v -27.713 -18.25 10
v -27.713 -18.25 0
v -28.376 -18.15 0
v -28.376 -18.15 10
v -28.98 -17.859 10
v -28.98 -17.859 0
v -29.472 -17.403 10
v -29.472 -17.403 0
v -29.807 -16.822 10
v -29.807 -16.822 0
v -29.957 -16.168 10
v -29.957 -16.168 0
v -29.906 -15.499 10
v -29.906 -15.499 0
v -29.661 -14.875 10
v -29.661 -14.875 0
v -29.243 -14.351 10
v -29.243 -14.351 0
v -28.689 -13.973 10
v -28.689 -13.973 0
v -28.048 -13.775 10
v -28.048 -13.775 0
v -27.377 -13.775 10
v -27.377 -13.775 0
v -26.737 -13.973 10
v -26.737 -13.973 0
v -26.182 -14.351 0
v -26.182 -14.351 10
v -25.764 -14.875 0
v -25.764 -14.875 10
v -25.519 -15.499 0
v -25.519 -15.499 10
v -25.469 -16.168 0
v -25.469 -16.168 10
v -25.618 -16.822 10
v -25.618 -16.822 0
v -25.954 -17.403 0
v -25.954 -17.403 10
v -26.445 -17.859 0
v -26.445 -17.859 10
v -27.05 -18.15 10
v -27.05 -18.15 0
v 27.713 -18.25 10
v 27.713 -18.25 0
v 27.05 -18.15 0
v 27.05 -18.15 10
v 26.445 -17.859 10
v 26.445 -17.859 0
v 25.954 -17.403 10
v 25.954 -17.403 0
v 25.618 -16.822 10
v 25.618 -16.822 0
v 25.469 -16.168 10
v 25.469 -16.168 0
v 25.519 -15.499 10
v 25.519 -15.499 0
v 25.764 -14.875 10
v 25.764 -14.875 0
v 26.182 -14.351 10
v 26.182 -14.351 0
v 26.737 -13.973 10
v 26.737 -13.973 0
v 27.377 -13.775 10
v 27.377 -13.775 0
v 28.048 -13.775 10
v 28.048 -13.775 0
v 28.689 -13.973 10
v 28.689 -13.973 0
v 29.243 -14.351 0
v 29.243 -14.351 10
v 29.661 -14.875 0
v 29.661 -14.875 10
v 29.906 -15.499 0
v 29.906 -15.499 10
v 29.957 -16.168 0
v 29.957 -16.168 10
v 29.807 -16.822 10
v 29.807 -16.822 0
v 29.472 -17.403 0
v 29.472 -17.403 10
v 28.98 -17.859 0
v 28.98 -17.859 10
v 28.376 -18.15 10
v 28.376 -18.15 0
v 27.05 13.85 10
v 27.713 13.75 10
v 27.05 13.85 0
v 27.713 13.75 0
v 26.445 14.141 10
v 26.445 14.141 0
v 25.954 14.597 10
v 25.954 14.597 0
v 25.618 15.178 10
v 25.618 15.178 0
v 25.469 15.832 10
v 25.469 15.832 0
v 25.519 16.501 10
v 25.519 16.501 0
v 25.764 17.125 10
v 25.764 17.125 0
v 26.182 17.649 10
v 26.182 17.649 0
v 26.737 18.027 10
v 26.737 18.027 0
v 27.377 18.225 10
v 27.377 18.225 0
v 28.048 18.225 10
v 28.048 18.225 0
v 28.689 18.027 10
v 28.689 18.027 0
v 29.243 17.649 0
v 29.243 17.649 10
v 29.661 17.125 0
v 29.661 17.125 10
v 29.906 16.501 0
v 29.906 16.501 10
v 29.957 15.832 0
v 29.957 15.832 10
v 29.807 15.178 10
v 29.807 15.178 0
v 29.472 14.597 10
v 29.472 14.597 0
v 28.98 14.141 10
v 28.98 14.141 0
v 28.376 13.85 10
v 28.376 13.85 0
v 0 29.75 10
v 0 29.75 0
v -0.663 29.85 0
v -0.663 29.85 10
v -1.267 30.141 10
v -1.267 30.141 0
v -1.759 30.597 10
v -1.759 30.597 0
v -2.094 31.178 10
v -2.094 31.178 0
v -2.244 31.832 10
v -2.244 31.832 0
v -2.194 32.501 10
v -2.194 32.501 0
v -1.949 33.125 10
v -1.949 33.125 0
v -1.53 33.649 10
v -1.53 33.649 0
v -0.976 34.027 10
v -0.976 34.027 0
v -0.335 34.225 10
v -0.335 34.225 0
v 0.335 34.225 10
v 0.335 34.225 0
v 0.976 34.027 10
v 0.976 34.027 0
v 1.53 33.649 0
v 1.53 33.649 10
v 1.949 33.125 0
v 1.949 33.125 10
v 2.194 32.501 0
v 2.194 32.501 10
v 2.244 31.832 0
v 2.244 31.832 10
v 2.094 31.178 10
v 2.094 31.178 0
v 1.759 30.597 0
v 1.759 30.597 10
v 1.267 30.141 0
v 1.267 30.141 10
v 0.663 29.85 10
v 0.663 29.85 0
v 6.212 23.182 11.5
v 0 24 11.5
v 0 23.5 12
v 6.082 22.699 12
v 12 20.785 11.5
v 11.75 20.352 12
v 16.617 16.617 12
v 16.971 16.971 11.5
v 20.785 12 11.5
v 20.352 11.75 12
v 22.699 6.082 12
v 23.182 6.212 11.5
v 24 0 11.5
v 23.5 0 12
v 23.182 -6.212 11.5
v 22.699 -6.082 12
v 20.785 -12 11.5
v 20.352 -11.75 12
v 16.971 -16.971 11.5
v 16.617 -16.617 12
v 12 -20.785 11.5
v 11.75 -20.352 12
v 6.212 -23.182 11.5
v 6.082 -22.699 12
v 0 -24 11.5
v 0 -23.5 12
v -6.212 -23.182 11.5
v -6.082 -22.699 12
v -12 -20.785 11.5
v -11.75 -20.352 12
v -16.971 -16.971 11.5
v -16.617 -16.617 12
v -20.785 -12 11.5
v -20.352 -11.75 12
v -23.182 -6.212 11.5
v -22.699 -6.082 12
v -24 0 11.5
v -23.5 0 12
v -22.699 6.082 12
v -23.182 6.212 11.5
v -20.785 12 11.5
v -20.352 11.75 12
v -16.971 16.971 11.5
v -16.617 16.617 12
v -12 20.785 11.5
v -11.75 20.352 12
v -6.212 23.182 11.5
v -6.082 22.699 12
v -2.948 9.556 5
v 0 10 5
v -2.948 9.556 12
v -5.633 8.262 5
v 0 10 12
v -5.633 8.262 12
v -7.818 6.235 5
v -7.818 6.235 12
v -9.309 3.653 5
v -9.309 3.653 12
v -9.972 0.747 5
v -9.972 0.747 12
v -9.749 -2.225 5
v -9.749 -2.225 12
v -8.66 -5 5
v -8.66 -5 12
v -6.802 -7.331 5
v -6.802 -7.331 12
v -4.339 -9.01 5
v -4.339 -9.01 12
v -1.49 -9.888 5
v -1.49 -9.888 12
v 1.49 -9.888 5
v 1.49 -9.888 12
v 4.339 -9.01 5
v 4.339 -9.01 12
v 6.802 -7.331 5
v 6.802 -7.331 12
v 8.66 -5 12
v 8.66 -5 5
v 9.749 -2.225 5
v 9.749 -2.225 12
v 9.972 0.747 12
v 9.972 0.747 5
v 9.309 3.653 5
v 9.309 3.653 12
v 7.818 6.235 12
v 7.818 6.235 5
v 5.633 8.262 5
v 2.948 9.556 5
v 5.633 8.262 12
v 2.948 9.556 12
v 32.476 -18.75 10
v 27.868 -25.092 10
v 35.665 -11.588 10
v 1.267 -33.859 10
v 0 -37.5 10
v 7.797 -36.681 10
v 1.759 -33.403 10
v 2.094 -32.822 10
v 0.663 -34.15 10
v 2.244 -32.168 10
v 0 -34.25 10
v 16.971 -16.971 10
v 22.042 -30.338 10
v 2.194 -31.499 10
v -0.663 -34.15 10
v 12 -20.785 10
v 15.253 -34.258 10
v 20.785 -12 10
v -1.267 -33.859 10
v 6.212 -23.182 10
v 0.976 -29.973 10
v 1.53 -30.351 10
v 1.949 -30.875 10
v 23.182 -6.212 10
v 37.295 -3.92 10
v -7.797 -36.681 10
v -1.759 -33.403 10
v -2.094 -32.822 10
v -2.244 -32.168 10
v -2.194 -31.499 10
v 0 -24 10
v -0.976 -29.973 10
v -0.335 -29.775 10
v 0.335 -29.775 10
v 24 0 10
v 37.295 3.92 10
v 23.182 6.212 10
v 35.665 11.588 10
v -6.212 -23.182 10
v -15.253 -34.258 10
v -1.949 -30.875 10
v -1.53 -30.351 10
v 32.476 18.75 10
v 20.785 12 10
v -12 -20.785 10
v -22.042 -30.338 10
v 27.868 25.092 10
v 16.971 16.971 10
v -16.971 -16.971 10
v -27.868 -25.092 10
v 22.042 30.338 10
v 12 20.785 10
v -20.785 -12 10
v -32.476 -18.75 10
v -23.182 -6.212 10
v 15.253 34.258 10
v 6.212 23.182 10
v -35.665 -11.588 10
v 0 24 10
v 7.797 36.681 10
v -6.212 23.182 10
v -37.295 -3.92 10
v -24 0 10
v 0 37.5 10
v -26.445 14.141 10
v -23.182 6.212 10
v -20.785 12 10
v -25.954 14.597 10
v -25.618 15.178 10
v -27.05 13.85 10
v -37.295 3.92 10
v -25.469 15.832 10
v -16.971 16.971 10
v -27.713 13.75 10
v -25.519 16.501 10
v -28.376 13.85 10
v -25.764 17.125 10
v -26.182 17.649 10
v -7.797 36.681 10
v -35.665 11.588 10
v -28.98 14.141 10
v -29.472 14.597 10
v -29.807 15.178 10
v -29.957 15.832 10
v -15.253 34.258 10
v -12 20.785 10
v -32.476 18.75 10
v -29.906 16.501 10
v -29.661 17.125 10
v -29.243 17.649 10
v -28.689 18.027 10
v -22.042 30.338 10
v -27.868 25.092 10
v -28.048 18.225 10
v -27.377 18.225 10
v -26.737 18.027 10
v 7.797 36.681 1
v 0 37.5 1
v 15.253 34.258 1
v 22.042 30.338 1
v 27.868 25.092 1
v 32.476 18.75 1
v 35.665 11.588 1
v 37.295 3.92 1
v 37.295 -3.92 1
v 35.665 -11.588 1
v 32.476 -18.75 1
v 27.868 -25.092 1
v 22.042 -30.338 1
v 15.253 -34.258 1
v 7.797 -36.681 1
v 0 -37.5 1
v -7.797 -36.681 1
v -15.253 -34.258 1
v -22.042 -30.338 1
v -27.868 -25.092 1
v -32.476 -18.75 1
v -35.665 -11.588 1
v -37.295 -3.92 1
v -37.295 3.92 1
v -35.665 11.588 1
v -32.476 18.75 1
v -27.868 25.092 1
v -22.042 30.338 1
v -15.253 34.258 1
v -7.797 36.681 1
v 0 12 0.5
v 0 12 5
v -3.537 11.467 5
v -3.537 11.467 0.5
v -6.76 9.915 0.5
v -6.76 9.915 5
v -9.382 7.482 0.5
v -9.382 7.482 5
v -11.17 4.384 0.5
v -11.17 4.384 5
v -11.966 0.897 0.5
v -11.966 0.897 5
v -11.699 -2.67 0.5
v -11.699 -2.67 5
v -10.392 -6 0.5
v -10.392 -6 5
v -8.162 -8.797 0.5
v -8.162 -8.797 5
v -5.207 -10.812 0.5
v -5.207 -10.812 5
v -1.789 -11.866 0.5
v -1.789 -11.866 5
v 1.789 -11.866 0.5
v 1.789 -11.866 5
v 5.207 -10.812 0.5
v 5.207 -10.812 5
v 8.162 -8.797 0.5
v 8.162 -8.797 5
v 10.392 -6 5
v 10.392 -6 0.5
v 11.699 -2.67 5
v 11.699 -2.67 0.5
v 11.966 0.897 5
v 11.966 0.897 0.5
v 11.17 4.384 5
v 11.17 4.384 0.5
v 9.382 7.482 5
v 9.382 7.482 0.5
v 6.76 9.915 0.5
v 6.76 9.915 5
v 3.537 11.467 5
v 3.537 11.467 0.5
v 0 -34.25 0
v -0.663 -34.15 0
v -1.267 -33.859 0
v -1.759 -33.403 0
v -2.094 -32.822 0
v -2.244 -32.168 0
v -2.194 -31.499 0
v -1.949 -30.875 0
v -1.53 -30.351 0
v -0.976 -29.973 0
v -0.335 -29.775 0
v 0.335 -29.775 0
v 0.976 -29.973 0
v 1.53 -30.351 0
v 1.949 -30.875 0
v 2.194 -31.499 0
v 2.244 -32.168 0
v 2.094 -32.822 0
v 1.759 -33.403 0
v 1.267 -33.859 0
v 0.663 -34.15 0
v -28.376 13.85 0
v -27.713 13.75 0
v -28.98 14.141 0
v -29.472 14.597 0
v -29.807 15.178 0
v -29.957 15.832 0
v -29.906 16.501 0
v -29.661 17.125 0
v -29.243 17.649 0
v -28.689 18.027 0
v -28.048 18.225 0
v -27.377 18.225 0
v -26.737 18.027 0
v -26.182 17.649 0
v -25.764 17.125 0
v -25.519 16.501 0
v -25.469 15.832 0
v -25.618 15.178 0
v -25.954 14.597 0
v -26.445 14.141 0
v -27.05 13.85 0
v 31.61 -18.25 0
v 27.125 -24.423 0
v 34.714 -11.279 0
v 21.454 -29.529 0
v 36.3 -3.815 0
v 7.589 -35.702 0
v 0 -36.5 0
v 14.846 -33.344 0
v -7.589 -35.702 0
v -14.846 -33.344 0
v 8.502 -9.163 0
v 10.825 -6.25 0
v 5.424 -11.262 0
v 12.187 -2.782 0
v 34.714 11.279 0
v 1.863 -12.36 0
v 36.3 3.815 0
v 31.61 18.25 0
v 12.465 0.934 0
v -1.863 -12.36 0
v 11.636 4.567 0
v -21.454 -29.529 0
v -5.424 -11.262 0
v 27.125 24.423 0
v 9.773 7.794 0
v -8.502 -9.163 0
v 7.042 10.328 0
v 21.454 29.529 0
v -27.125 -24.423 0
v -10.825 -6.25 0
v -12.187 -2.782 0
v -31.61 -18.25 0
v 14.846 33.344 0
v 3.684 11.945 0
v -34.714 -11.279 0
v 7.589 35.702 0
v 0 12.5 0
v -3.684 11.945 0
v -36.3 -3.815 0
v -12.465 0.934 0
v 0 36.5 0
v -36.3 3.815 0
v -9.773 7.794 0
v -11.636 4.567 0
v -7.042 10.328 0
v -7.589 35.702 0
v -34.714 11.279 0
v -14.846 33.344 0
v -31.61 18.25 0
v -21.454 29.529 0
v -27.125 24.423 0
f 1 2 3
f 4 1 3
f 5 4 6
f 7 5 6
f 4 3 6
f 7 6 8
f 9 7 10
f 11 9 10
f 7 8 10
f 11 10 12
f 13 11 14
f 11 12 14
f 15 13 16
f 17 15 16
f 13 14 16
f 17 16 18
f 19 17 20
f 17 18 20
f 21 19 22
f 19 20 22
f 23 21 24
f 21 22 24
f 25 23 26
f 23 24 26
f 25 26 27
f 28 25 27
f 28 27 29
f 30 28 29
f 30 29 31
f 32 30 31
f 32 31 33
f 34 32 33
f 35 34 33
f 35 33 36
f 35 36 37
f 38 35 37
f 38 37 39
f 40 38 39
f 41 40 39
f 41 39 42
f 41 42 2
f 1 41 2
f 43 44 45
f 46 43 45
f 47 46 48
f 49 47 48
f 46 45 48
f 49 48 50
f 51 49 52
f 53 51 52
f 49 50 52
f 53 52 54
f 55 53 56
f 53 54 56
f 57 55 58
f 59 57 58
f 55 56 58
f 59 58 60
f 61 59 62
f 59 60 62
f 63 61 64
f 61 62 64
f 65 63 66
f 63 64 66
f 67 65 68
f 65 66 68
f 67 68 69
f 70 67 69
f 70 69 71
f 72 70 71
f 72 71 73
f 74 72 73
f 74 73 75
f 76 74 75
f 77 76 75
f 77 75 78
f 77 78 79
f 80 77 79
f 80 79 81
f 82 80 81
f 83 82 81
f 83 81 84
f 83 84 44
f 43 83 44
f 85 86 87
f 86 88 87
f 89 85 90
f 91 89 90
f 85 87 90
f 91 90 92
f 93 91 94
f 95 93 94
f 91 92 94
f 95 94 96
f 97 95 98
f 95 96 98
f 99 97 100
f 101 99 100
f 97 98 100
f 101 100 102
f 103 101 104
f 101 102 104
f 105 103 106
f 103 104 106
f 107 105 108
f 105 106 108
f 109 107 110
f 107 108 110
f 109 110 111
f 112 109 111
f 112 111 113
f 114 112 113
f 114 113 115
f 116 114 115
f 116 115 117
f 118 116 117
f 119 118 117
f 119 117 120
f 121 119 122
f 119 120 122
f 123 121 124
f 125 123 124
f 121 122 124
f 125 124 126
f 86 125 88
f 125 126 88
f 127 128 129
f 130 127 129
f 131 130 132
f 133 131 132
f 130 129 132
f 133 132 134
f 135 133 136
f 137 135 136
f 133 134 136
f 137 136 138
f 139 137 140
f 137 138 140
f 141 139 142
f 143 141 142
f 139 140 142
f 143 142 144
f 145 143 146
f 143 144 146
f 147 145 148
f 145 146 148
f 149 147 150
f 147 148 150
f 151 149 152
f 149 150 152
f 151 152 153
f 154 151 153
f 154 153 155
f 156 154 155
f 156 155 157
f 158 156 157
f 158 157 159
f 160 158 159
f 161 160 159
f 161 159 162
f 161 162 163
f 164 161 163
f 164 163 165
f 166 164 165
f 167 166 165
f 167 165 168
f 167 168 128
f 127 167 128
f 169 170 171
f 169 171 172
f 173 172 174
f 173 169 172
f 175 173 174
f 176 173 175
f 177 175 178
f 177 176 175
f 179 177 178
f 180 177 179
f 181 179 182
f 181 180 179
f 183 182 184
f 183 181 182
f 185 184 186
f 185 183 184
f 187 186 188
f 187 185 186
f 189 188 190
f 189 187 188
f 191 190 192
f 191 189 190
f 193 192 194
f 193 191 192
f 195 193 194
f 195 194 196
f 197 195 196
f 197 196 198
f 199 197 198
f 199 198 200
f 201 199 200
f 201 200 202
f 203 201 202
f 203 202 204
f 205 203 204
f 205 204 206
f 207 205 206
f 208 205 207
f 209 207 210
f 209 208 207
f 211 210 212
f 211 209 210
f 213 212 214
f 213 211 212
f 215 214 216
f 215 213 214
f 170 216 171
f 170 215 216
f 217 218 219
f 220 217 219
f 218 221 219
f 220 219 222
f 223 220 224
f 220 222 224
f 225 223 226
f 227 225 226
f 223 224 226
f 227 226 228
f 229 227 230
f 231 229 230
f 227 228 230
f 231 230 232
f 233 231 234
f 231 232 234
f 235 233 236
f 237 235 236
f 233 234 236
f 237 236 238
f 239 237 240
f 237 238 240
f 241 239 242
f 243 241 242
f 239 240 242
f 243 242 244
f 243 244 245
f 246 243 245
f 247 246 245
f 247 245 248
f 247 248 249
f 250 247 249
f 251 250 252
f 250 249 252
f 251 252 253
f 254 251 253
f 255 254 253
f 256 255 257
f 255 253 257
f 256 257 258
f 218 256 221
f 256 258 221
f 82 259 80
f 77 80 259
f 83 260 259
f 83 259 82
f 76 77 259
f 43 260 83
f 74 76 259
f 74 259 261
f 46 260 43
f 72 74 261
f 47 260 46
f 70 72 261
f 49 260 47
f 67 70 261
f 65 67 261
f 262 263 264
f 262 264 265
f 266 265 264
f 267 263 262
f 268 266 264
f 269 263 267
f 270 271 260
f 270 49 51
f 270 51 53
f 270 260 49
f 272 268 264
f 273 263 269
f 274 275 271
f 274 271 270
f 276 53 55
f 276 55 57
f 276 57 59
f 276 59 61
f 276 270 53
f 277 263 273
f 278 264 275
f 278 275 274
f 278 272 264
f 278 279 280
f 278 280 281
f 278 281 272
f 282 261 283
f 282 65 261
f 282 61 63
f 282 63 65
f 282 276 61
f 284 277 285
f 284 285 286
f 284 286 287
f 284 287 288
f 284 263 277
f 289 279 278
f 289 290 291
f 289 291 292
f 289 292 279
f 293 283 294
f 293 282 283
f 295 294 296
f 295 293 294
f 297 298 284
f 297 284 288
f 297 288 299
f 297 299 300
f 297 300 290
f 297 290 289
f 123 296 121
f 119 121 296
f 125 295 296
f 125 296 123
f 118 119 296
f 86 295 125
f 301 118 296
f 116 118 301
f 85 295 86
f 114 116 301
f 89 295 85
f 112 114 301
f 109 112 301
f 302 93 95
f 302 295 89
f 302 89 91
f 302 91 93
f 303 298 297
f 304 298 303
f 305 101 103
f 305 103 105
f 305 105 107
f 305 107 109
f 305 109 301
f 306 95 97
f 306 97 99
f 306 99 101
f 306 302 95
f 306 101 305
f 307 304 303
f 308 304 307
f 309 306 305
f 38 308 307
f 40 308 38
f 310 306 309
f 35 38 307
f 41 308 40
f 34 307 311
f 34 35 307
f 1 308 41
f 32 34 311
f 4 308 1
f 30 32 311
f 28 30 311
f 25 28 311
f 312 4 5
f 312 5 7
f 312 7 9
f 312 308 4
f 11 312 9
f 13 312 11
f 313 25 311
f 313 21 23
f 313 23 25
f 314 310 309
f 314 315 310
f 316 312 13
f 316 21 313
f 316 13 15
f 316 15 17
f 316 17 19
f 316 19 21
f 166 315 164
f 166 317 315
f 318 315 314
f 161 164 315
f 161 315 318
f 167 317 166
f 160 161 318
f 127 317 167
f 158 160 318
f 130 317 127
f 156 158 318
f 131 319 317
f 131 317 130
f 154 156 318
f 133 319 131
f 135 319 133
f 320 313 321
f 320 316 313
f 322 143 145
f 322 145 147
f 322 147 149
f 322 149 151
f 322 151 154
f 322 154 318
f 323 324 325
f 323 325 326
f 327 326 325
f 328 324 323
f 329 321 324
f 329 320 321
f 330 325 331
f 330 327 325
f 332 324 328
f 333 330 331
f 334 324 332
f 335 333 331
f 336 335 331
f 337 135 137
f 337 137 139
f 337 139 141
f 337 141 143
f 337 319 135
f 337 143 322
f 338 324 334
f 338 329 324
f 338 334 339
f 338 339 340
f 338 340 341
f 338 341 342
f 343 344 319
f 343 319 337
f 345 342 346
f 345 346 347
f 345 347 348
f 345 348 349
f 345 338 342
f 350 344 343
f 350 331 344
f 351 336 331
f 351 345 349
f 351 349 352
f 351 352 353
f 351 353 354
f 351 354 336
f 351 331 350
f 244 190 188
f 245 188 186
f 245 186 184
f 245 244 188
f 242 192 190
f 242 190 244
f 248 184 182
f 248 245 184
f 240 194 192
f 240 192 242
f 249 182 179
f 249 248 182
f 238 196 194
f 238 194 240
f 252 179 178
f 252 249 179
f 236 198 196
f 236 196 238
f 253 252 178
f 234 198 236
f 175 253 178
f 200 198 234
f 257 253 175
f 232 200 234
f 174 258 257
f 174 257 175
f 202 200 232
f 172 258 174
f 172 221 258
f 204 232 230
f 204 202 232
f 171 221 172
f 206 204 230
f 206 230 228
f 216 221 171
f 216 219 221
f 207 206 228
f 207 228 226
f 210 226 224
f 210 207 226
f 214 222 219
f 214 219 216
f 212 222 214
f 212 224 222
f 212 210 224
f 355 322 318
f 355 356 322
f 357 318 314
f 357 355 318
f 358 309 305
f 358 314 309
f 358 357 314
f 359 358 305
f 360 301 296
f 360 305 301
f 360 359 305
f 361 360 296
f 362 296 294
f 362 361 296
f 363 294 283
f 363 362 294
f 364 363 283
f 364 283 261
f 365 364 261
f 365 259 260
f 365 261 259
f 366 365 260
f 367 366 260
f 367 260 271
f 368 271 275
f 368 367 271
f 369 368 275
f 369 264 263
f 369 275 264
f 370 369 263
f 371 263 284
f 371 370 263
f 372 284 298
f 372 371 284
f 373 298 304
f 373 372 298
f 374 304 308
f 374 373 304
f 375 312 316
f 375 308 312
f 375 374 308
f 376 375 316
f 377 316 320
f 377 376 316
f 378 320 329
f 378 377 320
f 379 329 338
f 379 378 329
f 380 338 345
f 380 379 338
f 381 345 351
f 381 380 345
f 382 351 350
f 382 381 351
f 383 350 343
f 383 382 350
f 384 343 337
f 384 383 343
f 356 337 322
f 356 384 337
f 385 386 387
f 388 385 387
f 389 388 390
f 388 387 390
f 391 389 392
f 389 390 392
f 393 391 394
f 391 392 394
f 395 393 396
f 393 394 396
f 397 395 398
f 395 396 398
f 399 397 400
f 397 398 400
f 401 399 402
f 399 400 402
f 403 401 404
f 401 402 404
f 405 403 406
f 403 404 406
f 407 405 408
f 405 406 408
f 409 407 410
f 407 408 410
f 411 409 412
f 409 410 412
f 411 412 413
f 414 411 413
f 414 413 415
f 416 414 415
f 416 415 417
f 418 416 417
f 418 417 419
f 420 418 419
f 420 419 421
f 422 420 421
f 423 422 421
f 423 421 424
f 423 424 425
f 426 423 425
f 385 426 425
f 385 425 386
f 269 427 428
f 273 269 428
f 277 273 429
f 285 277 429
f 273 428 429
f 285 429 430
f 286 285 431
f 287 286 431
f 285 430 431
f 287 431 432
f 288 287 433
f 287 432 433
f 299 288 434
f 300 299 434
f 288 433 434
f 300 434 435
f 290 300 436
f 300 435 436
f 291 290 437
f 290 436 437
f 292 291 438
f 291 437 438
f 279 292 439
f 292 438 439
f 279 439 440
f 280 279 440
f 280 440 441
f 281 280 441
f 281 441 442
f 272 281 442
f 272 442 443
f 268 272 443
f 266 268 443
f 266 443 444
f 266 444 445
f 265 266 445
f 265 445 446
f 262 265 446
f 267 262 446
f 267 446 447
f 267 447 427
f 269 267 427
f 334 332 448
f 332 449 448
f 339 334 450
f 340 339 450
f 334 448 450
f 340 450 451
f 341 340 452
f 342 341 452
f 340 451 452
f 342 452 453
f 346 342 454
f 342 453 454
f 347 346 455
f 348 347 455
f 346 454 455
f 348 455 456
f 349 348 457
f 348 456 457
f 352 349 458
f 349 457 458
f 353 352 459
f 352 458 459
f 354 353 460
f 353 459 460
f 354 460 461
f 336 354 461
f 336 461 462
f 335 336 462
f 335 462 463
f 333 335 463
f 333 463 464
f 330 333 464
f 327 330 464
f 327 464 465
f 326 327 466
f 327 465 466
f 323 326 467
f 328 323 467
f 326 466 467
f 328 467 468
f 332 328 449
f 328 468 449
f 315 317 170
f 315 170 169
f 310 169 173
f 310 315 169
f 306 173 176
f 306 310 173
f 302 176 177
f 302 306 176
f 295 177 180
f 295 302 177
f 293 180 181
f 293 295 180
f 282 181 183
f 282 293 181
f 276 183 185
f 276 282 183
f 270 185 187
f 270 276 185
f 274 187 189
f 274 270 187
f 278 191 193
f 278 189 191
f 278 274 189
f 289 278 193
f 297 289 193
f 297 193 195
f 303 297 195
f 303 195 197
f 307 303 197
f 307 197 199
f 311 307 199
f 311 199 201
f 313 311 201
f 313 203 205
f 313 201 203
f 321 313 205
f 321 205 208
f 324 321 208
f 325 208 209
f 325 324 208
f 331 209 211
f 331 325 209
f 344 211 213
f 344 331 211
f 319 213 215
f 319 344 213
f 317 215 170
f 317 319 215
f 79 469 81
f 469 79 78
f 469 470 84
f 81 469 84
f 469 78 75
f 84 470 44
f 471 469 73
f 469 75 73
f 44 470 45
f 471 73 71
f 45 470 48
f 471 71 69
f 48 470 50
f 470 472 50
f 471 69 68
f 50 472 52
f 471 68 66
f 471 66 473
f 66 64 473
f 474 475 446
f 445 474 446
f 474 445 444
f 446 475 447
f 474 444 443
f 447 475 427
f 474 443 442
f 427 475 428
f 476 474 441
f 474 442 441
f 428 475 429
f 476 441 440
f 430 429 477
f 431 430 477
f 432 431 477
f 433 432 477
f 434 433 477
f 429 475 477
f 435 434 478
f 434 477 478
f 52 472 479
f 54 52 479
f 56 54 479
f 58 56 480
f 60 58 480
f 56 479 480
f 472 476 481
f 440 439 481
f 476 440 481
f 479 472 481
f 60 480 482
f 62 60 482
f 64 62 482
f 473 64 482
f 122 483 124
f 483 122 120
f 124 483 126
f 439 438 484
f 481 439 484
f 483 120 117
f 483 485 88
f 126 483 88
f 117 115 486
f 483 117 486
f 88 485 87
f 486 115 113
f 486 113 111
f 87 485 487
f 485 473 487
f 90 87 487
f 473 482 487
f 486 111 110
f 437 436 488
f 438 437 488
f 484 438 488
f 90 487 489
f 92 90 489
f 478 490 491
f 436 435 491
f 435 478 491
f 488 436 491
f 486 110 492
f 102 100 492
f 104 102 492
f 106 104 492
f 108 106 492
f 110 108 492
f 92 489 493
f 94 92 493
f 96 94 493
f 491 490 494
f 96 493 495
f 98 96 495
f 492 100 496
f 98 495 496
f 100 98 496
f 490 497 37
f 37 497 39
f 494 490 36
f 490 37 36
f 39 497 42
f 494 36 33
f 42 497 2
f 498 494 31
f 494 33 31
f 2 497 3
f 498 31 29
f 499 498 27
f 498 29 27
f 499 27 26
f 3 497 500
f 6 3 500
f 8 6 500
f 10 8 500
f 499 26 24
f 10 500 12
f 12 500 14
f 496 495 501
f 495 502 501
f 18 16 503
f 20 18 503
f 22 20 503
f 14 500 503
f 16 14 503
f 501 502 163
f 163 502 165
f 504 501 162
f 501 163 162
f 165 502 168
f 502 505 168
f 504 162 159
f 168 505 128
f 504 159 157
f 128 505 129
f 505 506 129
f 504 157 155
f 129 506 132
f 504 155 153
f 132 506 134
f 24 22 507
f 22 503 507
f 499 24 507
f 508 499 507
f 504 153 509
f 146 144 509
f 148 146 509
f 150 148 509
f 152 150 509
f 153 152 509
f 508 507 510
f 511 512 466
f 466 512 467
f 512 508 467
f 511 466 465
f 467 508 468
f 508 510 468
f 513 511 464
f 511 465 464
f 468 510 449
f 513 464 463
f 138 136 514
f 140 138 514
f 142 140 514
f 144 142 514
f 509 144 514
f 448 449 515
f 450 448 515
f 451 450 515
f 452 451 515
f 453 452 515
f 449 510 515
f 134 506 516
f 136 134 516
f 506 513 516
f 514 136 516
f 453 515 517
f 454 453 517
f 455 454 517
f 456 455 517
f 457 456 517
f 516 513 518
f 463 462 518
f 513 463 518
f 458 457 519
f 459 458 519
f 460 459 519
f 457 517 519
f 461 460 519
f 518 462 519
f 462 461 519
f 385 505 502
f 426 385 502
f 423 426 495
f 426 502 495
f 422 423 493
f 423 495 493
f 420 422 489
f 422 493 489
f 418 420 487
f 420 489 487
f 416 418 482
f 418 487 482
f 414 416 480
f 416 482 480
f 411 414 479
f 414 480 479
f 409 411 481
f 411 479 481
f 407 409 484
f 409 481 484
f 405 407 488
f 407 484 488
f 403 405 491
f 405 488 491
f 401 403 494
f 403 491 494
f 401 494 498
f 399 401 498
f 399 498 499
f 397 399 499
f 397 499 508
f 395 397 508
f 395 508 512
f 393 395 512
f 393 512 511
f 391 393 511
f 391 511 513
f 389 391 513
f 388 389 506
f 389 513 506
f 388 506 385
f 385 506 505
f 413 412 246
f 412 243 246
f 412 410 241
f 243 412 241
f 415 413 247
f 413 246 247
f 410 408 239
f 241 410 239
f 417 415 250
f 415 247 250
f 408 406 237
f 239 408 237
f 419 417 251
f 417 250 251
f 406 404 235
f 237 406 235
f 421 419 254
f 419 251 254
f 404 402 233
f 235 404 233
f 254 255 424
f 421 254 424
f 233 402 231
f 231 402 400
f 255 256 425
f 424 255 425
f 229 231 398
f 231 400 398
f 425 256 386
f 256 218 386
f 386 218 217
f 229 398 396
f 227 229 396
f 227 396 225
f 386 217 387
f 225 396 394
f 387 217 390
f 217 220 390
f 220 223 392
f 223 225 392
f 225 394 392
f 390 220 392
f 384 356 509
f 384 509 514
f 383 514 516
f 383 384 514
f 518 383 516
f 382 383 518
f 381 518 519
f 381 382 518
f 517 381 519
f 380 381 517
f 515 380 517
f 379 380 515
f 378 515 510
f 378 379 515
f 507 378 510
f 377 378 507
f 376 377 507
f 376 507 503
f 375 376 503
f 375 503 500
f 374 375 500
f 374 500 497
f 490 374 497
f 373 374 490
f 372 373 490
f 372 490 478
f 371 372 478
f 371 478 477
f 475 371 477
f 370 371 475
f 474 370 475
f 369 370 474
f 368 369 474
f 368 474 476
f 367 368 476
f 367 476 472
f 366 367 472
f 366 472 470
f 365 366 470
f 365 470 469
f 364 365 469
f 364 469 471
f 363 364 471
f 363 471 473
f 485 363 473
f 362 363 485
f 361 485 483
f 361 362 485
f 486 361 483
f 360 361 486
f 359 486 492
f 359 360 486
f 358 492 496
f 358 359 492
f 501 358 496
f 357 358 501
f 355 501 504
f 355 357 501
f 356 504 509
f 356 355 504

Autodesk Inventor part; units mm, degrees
ref_plane "YZ Plane" through (0, 0, 0) normal (1, 0, 0) x (0, 1, 0)
ref_plane "XZ Plane" through (0, 0, 0) normal (0, 1, 0) x (-1, 0, 0)
ref_plane "XY Plane" through (0, 0, 0) normal (0, 0, 1) x (1, 0, 0)
sketch "スケッチ1" plane through (0, 0, 0) normal (1, 0, 0) x (0, 1, 0)
  line L0 (12, 0) -> (12, 5)
  line L1 (12, 5) -> (10, 5)
  line L2 (10, 5) -> (10, 10)
  line L3 (37.5, 10) -> (37.5, 0)
  line L4 (37.5, 0) -> (12, 0)
  line L5 (0, -2.4) -> (0, 14.4) projected
  line L6 (10, 10) -> (10, 10)
  line L7 (10, 10) -> (10, 12)
  line L8 (10, 12) -> (24, 12)
  line L9 (24, 12) -> (24, 10)
  line L10 (24, 10) -> (37.5, 10)
  point P0 (0, 0)
  dimension "d0" = 12
  dimension "d1" = 37.5
  dimension "d2" = 2
  dimension "d3" = 5
  dimension "d5" = 10
  dimension "d31" = 24
  dimension "d32" = 2
  dimension "d34" = 0
revolve "回転1" add sketch "スケッチ1" angle 360 about axis through (0, 0, -10) along (0, 0, 1)
chamfer "面取り1" distance 0.5 angle 45 1 edges at (0, -12, 0)
sketch "スケッチ2" plane through (0, 0, 10) normal (0, 0, 1) x (1, 0, 0)
  circle A0 centre (0, 0) radius 32
  point P0 (0, 32)
  point P1 (-27.7128, 16)
  point P2 (-27.7128, -16)
  point P3 (0, -32)
  point P4 (27.7128, -16)
  point P5 (27.7128, 16)
  dimension "d10" = 64
  dimension "d13" = 360
hole "穴1" at (0, 32, 10) at (-27.7128, 16, 10) at (-27.7128, -16, 10) at (0, -32, 10) at (27.7128, -16, 10) at (27.7128, 16, 10) direction (0, 0, -1) diameter 4.5 end through all clearance for "Flat Head Machine Screw" size "M4" standard "Ansi Metric M Profile"
chamfer "面取り2" distance 1 angle 45 1 edges at (0, -37.5, 0)
chamfer "面取り3" distance 0.5 angle 45 1 edges at (0, -24, 12)
properties part number "unit-j2-base3" material "ABS プラスチック"
